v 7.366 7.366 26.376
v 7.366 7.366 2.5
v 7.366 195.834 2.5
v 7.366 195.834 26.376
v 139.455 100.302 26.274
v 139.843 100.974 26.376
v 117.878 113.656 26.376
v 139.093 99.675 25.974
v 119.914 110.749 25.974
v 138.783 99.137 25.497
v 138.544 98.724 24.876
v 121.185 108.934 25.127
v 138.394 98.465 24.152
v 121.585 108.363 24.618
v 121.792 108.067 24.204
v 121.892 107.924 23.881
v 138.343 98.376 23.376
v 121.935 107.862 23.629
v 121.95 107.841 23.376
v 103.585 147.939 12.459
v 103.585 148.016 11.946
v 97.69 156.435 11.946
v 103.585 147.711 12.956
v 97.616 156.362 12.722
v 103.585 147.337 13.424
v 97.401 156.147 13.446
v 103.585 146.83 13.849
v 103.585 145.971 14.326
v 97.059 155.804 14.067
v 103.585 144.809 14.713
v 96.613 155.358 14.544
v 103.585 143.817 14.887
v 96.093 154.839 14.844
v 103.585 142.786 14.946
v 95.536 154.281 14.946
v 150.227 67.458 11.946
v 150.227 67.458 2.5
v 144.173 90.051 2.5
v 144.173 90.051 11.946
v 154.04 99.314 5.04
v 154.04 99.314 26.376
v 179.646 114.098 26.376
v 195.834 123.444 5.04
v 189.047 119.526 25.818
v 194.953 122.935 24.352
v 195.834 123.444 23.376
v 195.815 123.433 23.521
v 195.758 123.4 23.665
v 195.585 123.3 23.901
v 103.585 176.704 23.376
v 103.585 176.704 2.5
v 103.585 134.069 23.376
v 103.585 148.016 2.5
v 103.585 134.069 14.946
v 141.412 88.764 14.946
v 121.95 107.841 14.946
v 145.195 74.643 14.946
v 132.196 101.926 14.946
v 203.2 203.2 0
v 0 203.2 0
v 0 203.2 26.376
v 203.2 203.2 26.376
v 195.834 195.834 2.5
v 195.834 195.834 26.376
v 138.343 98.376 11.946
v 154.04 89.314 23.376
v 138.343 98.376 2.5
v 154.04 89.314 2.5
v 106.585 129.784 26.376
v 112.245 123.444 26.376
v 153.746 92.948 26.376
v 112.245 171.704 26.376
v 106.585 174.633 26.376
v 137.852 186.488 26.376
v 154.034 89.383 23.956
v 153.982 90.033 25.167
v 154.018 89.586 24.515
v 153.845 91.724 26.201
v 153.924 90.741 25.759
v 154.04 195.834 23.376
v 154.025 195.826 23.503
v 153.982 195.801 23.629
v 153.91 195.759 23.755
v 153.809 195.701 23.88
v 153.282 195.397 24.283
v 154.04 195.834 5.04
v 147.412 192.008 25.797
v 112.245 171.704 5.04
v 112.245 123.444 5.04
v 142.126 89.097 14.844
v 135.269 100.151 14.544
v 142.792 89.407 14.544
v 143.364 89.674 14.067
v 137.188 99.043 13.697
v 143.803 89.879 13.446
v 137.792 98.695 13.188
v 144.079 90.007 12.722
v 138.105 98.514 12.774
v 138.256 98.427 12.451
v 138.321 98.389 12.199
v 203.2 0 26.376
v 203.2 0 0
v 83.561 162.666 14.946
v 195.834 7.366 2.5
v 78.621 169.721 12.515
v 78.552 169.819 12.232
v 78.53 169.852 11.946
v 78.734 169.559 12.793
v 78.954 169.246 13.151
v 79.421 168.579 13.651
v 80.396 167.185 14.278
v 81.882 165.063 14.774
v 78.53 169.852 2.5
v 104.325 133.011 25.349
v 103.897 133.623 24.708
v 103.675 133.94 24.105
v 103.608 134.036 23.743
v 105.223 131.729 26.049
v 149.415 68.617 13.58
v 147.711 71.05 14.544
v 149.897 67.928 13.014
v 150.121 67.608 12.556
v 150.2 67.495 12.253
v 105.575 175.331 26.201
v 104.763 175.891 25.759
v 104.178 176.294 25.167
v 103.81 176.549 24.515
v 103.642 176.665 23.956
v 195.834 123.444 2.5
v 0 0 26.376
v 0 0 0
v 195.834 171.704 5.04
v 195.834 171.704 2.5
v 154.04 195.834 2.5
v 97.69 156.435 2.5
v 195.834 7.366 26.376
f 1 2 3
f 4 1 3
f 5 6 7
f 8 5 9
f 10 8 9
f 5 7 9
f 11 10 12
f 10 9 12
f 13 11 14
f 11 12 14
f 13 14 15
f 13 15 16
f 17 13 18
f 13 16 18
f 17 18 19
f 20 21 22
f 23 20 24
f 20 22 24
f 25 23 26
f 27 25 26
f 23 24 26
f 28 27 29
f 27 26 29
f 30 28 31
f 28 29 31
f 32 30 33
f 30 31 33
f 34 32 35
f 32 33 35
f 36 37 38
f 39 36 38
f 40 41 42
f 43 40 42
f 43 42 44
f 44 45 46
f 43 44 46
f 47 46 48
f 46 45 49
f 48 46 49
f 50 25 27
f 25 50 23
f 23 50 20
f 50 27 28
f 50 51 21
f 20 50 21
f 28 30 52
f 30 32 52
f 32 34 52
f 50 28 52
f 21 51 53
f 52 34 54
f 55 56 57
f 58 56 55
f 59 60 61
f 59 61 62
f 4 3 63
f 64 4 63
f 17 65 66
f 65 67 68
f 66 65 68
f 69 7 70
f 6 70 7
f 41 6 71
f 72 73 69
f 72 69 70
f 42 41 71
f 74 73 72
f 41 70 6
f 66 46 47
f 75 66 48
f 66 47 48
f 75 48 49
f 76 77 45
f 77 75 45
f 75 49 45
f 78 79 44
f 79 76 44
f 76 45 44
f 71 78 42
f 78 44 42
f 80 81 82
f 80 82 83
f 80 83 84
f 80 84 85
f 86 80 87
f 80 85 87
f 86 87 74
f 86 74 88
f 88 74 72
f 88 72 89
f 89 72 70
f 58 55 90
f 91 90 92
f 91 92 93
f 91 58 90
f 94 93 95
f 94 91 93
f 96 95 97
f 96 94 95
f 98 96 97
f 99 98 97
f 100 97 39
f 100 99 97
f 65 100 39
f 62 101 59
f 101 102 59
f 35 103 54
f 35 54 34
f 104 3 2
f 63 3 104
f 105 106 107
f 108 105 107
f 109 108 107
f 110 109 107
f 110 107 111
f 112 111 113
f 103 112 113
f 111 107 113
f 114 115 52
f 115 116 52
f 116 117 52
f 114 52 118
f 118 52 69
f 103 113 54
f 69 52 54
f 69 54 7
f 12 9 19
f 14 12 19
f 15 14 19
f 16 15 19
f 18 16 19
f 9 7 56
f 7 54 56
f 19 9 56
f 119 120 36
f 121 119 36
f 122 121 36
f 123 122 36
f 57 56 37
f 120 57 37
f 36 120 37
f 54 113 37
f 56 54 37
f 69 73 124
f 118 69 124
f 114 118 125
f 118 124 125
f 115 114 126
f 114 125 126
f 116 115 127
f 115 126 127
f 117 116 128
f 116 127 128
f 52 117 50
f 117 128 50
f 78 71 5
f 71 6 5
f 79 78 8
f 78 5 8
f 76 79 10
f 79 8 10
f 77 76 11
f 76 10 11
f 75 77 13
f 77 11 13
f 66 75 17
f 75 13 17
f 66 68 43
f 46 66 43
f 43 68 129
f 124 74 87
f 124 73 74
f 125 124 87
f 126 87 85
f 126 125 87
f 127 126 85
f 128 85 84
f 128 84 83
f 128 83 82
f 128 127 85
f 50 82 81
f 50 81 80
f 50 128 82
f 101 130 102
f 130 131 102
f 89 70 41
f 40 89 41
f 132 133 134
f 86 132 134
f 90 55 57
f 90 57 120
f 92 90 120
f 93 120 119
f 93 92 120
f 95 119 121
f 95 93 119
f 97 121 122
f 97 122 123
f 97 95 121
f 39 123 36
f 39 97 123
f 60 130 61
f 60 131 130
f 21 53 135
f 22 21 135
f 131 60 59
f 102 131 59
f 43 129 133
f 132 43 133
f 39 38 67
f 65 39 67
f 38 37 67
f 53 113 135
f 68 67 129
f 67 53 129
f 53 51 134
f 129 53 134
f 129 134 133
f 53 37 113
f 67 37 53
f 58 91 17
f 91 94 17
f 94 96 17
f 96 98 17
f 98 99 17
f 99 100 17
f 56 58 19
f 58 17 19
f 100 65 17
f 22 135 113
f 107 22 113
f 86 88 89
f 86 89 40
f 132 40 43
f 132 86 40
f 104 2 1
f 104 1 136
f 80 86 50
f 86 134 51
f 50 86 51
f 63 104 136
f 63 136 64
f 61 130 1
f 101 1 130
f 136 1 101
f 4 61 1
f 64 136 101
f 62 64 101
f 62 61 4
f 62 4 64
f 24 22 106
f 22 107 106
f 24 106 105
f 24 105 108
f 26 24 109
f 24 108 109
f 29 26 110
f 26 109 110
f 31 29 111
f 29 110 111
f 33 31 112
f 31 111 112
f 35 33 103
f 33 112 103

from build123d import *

# Parameters (mm, degrees)
F0_W     = 203.2
F0_H     = 203.2
F1_DEPTH = 2.5
F2_W     = 203.2
F2_H     = 203.2
F2_W_2   = 188.468
F2_H_2   = 188.468
F3_DEPTH = 23.876
F5_DEPTH = 23.876
F7_DEPTH = 21.336
F9_DEPTH = 11.43
F10_R    = 3


with BuildPart() as f1:
    # F0 (on Top) → F1 (new body)
    with BuildSketch(Plane.XY):
        with Locations((101.6, 101.6)):
            Rectangle(F0_W, F0_H)
    extrude(amount=F1_DEPTH)

    # F2 (on face) → F3 (join)
    with BuildSketch(Plane.XY.offset(2.5)):
        with Locations((101.6, 101.6)):
            Rectangle(F2_W, F2_H)
        with Locations((101.6, 101.6)):
            Rectangle(F2_W_2, F2_H_2, mode=Mode.SUBTRACT)
    extrude(amount=F3_DEPTH)


with BuildPart() as f5:
    # F4 (on face) → F5 (new body)
    with BuildSketch(Plane.XY.offset(2.5)):
        Polygon((195.834, 123.444), (195.834, 171.704), (154.039614, 195.834), (103.584974, 176.704), (103.584974, 148.016252), (97.689823, 156.4354), (78.5295, 169.851603), (150.226555, 67.457597), (144.172665, 90.051022), (138.343238, 98.376307), (154.039614, 89.314), align=None)
    extrude(amount=F5_DEPTH)

    # F6 (on face) → F7 (cut)
    with BuildSketch(Plane.XY.offset(26.376)):
        Polygon((195.834, 171.704), (154.039614, 195.834), (112.245228, 171.704), (112.245228, 123.444), (154.039614, 99.314), (195.834, 123.444), align=None)
    extrude(amount=-F7_DEPTH, mode=Mode.SUBTRACT)

    # F8 (on face) → F9 (cut)
    with BuildSketch(Plane.XY.offset(26.376)):
        Polygon((97.689823, 156.4354), (78.5295, 169.851603), (103.584974, 134.068678), (103.584974, 148.016252), align=None)
        Polygon((121.949712, 107.841113), (150.226555, 67.457597), (144.172665, 90.051022), (138.343238, 98.376307), align=None)
    extrude(amount=-F9_DEPTH, mode=Mode.SUBTRACT)

    # F10
    f10_edges = [f5.edges().sort_by_distance(p)[0] for p in [
        (103.584974, 155.386339, 26.376),
        (137.994663, 98.577557, 26.376),
        (174.936807, 106.379, 26.376),
        (128.812294, 186.269, 26.376),
        (88.109662, 163.143501, 14.946),
        (147.19961, 78.75431, 14.946),
        (141.257951, 94.213665, 14.946),
        (100.637399, 152.225826, 14.946),
    ]]
    fillet(f10_edges, radius=F10_R)


solid = Compound([f1.part, f5.part])
